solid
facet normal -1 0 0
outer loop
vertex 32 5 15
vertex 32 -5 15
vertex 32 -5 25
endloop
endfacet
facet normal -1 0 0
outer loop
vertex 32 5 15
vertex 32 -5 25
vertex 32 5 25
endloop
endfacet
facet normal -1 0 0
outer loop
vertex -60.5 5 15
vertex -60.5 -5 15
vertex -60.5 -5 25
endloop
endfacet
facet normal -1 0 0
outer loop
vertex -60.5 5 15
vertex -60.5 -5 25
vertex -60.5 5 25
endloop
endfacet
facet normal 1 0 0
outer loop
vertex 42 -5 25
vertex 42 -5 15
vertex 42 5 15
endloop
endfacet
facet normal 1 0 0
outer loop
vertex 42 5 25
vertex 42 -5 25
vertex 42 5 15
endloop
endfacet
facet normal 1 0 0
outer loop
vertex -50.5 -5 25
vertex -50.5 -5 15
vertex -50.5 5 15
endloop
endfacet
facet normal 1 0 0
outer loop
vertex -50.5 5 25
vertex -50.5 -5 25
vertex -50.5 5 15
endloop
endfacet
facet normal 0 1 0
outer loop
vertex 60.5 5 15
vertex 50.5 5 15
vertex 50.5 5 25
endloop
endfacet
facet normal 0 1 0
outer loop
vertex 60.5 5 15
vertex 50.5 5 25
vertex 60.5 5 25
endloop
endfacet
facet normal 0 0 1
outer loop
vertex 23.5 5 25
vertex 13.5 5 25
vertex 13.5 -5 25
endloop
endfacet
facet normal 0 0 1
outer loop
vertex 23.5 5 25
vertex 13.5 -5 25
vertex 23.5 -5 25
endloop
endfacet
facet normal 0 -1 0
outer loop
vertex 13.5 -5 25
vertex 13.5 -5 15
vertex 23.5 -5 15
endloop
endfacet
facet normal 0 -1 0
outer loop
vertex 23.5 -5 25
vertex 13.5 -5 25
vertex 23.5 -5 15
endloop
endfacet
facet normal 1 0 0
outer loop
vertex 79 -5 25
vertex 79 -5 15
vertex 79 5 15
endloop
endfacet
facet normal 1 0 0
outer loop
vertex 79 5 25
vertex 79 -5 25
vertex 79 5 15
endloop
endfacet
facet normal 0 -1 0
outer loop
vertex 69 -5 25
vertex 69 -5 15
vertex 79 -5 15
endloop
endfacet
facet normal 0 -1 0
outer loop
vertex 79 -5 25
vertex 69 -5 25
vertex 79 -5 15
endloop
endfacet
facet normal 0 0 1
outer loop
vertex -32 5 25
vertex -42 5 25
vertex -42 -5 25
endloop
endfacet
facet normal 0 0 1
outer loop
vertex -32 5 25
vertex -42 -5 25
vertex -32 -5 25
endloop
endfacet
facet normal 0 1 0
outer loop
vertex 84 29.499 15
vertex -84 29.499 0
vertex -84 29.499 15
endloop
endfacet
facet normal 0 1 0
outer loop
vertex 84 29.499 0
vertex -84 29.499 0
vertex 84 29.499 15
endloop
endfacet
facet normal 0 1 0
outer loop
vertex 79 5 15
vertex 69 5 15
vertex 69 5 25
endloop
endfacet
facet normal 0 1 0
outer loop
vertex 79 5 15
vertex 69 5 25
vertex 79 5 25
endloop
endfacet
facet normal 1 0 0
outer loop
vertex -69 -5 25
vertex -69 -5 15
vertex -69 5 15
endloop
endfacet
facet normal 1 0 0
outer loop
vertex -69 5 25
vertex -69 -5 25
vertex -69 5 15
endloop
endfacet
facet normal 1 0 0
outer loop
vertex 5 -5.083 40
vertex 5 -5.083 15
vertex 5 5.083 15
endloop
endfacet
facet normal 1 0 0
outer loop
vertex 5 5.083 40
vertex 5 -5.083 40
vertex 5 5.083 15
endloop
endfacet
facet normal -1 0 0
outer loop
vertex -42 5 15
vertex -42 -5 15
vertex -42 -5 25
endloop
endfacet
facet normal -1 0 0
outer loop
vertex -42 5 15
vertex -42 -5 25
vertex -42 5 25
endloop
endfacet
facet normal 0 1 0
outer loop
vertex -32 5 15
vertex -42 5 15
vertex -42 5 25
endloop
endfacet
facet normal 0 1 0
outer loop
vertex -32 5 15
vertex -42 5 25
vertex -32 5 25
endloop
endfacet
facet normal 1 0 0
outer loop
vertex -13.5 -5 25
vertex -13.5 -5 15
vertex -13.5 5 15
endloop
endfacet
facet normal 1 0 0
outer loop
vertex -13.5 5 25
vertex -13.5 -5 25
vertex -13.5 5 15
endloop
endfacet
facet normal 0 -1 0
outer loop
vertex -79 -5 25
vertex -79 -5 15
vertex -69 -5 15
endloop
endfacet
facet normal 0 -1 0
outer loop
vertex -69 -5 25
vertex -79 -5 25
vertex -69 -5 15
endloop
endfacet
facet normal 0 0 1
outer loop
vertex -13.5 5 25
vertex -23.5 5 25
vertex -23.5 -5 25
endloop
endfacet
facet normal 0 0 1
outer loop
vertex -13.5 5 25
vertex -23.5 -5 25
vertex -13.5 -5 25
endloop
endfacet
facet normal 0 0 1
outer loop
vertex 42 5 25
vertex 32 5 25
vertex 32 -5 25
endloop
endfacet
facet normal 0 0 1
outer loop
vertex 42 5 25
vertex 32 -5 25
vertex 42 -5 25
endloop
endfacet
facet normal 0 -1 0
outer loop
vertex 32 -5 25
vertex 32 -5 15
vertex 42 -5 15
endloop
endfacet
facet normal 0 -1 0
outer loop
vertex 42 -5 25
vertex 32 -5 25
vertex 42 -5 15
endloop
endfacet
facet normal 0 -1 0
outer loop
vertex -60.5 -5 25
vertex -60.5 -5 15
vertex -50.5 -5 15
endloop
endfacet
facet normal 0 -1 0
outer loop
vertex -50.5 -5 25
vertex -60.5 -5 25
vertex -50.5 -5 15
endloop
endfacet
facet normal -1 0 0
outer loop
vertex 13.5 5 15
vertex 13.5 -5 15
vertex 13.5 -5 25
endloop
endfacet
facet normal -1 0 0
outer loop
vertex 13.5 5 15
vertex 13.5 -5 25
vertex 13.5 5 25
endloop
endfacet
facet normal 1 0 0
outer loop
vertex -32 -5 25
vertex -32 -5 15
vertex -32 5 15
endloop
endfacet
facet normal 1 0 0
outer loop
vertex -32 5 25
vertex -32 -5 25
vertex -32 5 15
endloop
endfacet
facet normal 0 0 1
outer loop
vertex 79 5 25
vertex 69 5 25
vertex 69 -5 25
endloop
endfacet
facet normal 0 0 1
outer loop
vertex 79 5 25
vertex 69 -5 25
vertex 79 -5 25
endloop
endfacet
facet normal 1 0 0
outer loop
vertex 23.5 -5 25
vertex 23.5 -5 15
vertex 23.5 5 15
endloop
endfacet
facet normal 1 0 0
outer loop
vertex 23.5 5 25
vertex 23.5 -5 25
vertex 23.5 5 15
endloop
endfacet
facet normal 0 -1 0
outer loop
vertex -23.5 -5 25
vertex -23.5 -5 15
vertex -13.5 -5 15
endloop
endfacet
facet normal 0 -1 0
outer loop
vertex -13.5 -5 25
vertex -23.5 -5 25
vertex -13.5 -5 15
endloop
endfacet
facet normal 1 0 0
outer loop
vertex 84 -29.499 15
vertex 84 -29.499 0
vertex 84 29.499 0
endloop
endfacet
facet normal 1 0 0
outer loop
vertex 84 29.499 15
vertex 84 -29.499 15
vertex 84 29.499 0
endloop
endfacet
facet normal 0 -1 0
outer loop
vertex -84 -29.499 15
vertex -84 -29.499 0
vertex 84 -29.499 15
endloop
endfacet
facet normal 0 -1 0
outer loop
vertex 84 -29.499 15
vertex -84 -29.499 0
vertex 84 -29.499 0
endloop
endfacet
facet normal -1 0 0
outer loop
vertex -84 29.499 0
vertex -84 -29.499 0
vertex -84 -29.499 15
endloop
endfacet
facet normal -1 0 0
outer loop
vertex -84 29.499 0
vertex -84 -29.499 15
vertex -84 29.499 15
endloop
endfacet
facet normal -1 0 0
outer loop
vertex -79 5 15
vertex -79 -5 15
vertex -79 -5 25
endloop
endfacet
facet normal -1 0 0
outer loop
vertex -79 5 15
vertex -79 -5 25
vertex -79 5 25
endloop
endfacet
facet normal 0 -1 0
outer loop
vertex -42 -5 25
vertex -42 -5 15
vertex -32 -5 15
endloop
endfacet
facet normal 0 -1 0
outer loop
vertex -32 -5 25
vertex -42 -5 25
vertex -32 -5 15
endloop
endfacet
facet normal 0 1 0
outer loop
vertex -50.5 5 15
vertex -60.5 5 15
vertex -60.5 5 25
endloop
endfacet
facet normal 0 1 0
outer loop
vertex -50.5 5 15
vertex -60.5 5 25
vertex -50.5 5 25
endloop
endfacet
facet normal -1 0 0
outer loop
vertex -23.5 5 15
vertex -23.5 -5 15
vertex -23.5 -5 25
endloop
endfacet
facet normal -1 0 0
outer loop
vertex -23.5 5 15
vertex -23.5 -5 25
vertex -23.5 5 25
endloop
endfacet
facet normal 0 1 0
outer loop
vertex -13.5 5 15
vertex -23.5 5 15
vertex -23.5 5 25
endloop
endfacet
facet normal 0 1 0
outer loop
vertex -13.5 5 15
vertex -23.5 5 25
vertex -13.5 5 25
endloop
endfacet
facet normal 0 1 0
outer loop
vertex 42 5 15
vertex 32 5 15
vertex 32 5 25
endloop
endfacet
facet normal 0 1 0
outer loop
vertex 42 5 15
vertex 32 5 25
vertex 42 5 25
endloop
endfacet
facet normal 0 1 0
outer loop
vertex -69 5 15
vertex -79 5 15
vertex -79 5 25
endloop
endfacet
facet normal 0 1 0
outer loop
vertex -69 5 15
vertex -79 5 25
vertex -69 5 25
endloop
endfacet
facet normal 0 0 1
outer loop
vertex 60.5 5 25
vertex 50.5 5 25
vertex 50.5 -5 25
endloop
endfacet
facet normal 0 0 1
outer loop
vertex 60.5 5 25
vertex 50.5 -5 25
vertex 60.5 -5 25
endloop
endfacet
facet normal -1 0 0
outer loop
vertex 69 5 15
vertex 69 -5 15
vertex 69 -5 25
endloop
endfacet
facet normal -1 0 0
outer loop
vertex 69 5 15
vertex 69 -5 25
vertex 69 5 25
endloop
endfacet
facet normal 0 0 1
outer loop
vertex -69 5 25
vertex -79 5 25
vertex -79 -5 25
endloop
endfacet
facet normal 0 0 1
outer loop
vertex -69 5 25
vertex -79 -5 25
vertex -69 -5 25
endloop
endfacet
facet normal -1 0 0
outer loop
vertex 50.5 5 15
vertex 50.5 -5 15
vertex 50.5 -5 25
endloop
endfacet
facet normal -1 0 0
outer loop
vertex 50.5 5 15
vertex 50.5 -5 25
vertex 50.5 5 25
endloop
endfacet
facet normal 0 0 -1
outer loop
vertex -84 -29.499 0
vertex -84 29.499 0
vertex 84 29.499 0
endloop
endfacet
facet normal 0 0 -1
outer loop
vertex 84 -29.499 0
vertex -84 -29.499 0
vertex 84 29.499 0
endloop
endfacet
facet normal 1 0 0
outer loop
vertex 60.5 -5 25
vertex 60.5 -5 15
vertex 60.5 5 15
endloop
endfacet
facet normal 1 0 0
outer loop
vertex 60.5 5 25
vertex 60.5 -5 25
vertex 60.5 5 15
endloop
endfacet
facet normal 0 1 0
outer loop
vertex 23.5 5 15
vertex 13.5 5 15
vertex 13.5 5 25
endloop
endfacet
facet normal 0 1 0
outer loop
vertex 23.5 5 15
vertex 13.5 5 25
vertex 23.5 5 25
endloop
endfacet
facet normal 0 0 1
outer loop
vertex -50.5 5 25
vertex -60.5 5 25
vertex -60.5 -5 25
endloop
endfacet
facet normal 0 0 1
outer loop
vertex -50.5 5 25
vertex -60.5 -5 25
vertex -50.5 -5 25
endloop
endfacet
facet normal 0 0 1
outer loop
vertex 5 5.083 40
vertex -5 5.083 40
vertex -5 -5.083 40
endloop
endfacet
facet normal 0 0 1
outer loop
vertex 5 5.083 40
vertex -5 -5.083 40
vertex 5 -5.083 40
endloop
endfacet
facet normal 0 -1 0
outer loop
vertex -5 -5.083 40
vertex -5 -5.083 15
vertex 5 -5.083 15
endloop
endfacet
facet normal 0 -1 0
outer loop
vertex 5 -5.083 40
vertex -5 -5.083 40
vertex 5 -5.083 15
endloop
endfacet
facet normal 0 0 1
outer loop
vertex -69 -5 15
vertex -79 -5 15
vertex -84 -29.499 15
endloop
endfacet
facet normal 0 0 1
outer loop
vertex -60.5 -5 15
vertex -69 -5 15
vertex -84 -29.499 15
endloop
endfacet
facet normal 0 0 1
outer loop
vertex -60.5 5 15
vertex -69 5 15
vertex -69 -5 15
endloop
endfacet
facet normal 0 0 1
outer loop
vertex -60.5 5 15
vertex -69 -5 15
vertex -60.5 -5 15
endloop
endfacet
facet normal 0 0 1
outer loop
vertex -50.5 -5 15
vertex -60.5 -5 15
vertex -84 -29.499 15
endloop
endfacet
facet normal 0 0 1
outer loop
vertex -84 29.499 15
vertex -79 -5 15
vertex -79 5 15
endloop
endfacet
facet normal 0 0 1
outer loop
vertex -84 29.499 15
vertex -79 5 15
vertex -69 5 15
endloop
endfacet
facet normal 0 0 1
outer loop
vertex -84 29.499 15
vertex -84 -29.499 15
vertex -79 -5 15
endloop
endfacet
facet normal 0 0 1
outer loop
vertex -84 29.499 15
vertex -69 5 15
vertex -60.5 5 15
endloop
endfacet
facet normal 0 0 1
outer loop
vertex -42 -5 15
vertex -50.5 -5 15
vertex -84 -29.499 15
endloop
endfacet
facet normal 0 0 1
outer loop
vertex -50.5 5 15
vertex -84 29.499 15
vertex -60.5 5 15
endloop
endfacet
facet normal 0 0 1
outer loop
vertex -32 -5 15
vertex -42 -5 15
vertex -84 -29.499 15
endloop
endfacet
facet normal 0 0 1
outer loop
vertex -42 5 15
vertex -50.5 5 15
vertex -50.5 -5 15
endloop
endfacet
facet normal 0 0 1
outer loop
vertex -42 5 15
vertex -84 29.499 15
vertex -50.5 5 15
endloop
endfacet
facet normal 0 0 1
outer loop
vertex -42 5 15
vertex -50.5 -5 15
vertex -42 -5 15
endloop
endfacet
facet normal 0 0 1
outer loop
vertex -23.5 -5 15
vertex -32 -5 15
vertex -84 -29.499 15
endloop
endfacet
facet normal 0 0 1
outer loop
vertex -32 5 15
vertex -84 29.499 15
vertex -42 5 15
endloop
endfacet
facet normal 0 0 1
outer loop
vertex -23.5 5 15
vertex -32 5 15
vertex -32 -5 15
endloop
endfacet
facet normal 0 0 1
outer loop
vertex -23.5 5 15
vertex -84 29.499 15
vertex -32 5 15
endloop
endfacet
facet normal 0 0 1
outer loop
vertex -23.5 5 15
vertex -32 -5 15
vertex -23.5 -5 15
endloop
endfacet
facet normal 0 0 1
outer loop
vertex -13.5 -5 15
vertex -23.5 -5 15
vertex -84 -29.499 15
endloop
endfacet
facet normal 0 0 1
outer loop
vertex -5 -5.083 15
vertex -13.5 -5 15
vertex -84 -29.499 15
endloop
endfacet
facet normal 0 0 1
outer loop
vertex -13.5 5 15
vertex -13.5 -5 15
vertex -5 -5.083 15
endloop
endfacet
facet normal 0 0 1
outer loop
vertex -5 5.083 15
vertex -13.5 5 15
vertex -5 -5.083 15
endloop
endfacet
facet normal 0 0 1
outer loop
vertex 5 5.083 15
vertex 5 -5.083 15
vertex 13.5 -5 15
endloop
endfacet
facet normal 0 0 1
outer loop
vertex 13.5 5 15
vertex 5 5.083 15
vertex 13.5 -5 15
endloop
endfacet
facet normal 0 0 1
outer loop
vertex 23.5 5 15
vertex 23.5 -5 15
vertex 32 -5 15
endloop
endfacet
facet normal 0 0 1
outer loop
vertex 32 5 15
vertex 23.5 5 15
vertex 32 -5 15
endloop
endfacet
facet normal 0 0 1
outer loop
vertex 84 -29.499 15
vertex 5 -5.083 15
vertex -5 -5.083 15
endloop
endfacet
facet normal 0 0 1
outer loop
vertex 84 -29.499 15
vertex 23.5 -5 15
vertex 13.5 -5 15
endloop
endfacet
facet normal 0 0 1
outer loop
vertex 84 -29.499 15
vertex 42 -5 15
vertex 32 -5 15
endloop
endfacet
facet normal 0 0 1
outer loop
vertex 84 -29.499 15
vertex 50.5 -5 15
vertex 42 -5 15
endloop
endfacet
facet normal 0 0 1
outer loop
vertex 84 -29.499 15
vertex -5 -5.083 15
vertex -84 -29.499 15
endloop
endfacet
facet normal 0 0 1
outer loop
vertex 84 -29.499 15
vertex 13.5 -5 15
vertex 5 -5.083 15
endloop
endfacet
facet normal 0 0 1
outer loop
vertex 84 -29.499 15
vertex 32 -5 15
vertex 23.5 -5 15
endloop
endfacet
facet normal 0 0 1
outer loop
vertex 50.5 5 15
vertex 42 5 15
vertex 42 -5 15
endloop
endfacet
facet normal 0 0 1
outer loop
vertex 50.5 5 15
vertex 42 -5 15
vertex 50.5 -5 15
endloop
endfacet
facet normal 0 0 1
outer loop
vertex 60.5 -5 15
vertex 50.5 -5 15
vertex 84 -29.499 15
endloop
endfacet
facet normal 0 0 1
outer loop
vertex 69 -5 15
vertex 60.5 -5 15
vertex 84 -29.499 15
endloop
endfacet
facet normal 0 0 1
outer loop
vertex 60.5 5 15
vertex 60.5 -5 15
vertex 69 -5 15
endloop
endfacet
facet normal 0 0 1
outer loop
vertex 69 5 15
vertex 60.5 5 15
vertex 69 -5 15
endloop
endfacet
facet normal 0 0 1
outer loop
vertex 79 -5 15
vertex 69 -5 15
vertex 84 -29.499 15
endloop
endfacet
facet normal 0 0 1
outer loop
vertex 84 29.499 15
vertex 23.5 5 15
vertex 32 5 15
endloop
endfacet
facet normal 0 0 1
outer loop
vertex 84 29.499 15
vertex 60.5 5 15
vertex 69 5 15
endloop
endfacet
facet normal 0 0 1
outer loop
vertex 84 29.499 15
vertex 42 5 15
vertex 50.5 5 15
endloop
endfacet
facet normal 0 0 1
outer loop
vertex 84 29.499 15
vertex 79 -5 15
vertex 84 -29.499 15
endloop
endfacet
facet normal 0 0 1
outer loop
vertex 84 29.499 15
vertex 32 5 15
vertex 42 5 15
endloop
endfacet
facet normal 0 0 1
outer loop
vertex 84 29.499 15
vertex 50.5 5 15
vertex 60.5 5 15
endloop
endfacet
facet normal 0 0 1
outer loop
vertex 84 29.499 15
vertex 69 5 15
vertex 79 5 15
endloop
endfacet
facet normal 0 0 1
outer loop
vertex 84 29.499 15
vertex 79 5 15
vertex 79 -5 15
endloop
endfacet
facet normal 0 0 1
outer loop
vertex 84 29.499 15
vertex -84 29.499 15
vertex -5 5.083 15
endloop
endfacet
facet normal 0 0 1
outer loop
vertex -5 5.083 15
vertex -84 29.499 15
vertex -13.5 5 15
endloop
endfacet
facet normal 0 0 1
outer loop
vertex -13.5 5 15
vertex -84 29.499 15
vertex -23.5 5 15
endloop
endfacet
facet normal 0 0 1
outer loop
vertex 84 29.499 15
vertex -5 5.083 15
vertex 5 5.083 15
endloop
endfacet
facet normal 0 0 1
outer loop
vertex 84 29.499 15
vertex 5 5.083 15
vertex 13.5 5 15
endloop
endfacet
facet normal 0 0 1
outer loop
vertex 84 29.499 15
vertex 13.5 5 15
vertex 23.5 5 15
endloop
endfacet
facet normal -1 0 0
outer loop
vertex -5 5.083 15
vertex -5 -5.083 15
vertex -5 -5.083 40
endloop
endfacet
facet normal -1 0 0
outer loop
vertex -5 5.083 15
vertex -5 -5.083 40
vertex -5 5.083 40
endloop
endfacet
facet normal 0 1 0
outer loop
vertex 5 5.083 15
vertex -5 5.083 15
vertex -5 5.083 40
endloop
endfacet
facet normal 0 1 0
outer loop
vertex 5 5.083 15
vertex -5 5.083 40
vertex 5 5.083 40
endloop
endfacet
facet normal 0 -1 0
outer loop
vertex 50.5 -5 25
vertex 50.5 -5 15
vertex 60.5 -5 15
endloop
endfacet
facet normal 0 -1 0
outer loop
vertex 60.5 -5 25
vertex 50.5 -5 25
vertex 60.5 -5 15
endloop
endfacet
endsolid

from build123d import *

# Parameters (mm, degrees)
F0_W     = 168
F0_H     = 58.99848
F2_DEPTH = 15
F3_W     = 10
F3_H     = 10
F4_DEPTH = 25
F1_W     = 10
F1_H     = 10.166666
F5_DEPTH = 40


with BuildPart() as f2:
    # F0 (on Top) → F2 (new body)
    with BuildSketch(Plane.XY):
        Rectangle(F0_W, F0_H)
    extrude(amount=F2_DEPTH)

    # F3 (on Top) → F4 (join)
    with BuildSketch(Plane.XY):
        with Locations((-74, 0)):
            Rectangle(F3_W, F3_H)
        with Locations((-55.499591, 0)):
            Rectangle(F3_W, F3_H)
        with Locations((-36.999591, 0)):
            Rectangle(F3_W, F3_H)
        with Locations((-18.499591, 0)):
            Rectangle(F3_W, F3_H)
        with Locations((18.499591, 0)):
            Rectangle(F3_W, F3_H)
        with Locations((36.999591, 0)):
            Rectangle(F3_W, F3_H)
        with Locations((55.499591, 0)):
            Rectangle(F3_W, F3_H)
        with Locations((74, 0)):
            Rectangle(F3_W, F3_H)
    extrude(amount=F4_DEPTH)

    # F1 (on Top) → F5 (join)
    with BuildSketch(Plane.XY):
        Rectangle(F1_W, F1_H)
    extrude(amount=F5_DEPTH)


solid = f2.part
